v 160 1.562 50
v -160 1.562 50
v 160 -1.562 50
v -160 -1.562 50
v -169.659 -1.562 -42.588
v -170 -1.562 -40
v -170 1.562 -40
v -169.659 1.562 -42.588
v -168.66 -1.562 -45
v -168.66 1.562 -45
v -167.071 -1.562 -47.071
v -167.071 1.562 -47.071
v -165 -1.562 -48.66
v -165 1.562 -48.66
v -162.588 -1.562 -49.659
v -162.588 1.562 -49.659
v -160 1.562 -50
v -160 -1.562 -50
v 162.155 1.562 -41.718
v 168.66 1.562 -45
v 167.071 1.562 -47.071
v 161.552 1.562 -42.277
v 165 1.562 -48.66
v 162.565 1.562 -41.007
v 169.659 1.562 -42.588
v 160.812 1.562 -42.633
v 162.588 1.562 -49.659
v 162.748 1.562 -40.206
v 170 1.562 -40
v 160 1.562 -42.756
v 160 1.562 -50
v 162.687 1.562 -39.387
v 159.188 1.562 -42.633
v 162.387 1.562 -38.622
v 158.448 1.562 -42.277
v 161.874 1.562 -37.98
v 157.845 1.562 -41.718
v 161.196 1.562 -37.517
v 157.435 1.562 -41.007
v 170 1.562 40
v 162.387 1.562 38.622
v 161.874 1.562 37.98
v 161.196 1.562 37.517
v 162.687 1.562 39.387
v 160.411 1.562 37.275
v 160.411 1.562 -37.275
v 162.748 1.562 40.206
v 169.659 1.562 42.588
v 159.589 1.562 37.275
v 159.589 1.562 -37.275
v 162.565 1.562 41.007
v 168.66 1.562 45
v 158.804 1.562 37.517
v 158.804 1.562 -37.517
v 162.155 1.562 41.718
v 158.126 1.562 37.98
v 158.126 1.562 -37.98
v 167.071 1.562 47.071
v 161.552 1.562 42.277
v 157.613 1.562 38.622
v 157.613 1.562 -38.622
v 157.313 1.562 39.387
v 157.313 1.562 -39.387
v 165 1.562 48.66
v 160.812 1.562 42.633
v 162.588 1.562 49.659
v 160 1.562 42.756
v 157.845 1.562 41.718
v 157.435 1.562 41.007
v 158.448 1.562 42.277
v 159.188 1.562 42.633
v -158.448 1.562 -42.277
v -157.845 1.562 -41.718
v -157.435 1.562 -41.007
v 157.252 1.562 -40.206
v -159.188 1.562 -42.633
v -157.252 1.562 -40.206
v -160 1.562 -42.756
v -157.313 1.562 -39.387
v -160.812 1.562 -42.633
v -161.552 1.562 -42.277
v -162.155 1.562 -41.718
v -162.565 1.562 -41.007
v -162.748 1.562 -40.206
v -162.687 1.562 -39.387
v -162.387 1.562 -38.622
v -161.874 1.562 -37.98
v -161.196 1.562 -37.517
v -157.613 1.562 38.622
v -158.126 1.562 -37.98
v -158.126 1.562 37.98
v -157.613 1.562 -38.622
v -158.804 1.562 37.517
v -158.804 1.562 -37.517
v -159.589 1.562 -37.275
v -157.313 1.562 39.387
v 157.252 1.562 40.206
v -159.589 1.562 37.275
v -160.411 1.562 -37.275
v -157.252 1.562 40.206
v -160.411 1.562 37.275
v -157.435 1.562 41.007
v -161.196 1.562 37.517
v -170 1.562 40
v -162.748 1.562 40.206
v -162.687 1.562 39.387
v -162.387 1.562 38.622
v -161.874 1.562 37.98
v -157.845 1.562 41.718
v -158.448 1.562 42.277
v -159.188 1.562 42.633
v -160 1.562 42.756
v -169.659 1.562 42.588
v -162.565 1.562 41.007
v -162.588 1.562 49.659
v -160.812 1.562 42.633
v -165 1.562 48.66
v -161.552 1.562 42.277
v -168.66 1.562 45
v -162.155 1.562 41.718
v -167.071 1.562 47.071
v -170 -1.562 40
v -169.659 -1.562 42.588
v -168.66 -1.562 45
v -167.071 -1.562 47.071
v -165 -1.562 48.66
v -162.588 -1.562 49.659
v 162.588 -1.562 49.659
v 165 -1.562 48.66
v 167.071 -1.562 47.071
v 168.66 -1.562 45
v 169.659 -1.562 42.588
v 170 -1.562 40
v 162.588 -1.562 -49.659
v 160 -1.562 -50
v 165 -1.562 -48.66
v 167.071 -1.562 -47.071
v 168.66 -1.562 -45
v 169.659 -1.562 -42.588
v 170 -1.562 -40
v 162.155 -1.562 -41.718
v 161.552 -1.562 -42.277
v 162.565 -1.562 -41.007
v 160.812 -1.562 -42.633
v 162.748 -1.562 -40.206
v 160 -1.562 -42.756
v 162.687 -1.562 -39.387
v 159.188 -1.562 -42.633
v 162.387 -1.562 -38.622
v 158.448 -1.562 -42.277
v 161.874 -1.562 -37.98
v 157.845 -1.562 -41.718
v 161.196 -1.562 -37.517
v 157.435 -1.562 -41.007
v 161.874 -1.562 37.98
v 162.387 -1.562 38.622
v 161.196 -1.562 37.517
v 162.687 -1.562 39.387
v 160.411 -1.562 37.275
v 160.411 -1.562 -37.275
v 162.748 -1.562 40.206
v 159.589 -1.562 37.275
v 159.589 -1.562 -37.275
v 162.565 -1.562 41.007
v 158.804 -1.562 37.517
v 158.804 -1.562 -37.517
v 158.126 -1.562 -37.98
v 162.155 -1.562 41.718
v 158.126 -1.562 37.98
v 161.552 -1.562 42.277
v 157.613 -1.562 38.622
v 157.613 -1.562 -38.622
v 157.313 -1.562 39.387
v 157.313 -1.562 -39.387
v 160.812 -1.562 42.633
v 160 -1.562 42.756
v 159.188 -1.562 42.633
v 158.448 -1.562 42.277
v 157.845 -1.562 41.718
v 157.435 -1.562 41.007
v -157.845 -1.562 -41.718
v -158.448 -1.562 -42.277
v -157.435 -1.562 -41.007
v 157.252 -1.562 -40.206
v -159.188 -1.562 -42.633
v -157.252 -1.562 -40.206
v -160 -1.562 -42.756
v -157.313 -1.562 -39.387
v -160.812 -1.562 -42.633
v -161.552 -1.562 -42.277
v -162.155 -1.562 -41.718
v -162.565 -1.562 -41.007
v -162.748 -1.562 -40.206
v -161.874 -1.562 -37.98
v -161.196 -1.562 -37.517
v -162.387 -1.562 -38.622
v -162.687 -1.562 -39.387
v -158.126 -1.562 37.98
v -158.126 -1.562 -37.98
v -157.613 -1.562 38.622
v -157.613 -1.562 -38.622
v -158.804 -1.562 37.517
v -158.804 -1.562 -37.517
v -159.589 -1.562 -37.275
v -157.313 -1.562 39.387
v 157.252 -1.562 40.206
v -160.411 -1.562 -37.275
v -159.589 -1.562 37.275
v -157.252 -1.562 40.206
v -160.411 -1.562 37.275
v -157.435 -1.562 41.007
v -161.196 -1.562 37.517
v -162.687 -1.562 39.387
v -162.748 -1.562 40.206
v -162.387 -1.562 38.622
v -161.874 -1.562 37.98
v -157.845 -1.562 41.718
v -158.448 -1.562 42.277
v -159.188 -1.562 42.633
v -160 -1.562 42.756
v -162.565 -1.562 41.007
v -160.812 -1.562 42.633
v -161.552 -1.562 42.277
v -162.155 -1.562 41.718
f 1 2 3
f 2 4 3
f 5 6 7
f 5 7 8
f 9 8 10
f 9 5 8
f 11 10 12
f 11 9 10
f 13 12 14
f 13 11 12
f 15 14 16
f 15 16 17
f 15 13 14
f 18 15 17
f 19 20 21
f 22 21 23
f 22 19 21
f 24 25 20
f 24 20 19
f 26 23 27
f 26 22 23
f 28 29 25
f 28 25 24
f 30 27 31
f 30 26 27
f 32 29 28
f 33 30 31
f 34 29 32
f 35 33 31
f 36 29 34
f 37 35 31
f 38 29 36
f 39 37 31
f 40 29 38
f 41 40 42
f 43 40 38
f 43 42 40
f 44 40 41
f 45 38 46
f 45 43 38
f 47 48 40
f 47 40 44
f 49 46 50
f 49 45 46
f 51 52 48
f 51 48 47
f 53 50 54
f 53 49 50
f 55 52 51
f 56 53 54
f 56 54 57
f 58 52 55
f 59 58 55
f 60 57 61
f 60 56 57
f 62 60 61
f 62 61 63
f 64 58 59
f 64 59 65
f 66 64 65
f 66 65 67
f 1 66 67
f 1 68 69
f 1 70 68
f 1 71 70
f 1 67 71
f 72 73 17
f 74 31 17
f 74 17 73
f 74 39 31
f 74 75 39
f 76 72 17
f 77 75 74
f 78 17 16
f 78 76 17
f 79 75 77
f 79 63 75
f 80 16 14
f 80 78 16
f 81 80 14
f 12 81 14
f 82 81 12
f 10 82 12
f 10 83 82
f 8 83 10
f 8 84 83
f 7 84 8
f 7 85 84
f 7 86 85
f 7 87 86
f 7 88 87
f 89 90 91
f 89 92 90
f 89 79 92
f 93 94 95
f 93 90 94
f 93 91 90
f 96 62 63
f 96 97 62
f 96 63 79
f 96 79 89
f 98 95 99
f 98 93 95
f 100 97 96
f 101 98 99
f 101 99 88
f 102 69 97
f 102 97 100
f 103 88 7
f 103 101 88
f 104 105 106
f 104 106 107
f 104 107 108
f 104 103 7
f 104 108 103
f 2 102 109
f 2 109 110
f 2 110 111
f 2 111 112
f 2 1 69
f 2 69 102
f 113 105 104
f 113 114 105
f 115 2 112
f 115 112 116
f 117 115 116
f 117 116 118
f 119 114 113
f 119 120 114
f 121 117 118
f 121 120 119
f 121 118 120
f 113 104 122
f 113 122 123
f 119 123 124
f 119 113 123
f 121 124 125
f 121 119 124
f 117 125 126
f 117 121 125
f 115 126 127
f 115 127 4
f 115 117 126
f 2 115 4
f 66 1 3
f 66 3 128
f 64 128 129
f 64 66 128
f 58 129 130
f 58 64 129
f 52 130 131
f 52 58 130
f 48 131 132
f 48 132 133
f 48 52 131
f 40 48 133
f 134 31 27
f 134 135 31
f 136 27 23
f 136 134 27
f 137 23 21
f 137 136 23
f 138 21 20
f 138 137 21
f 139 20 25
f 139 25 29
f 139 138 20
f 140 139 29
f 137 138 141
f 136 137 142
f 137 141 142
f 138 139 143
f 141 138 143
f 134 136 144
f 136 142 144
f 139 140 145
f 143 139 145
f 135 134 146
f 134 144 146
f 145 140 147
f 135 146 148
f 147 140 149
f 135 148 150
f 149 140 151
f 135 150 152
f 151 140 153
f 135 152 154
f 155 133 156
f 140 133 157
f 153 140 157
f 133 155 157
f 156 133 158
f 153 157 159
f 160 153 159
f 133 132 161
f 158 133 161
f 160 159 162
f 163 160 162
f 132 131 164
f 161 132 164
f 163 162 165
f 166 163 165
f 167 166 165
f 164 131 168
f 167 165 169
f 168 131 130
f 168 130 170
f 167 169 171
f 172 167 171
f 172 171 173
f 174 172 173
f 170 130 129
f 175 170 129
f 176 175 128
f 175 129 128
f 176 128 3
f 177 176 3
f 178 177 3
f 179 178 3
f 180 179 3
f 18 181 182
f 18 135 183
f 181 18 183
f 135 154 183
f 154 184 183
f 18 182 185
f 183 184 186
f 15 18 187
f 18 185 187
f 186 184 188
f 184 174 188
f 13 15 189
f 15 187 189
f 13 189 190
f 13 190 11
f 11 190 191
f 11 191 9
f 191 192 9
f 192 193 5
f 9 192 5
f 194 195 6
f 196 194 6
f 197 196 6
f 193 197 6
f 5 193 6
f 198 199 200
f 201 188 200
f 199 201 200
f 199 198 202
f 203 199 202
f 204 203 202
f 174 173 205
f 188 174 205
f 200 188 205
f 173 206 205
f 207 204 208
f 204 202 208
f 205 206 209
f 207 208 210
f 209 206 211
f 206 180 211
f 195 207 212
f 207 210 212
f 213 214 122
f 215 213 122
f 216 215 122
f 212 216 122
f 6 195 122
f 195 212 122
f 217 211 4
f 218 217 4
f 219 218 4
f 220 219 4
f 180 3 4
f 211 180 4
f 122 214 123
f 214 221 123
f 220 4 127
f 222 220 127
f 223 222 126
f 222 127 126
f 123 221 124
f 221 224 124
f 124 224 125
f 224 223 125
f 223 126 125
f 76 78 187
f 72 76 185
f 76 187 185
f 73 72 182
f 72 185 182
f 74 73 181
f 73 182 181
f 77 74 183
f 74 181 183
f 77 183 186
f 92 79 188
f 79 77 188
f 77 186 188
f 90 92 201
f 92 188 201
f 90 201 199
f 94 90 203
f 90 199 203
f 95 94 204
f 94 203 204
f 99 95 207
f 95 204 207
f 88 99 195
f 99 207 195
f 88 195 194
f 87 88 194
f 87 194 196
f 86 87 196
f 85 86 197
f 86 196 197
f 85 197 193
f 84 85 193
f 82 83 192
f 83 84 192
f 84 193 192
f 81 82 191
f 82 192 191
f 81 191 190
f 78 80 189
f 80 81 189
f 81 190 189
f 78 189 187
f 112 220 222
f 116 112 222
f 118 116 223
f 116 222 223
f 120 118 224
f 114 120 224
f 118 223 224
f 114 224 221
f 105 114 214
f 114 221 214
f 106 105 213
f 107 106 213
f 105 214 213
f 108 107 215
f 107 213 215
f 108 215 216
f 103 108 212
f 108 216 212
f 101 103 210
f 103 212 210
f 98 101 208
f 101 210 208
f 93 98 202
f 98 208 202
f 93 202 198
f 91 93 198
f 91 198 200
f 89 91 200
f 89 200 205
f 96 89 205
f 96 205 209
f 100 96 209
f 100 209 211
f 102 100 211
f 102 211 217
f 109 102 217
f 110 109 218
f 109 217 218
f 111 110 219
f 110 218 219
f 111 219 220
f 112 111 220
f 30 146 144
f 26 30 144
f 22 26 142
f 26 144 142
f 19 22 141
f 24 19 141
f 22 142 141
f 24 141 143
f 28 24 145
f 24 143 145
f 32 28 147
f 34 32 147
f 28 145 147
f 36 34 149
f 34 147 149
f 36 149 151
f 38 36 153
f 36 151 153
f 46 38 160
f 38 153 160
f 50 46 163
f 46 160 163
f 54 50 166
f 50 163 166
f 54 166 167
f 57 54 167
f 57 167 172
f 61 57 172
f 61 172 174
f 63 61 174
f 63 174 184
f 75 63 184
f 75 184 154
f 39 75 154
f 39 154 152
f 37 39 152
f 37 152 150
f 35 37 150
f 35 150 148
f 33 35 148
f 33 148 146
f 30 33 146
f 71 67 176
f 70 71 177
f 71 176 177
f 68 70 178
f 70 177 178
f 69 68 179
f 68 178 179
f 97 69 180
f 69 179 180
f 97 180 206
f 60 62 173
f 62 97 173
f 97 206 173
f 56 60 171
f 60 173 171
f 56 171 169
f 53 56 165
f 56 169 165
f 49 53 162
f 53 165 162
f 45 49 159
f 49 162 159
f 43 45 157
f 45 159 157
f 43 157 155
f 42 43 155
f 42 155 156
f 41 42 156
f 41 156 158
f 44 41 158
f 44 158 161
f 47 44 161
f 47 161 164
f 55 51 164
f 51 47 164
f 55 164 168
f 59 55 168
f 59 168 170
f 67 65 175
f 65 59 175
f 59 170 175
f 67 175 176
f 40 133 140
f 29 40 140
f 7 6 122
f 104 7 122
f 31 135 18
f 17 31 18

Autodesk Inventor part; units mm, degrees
ref_plane "YZ Plane" through (0, 0, 0) normal (1, 0, 0) x (0, 1, 0)
ref_plane "XZ Plane" through (0, 0, 0) normal (0, 1, 0) x (-1, 0, 0)
ref_plane "XY Plane" through (0, 0, 0) normal (0, 0, 1) x (1, 0, 0)
sketch "Sketch1" plane through (0, 0, 0) normal (0, 1, 0) x (-1, 0, 0)
  line L0 (170, 50) -> (-170, 50)
  line L1 (-170, 50) -> (-170, -50)
  line L2 (-170, -50) -> (170, -50)
  line L3 (170, -50) -> (170, 50)
  line L4 (170, 50) -> (-170, -50) construction
  line L5 (-170, 50) -> (170, -50) construction
  point P0 (0, 0)
  dimension "d0" = 340
  dimension "d1" = 100
extrude "Extrusion1" add sketch "Sketch1" along normal mid plane 3.125
fillet "Fillet1" radius 10 4 edges at (-170, 0, 50) (-170, 0, -50) (170, 0, -50) (170, 0, 50)
sketch "Sketch2" plane through (0, 1.5625, 0) normal (0, 1, 0) x (1, 0, 0)
  arc A0 (160, -50) -> (170, -40) centre (160, -40) ccw projected
  line L0 (160, 50) -> (-160, 50) projected
  arc A1 (-160, 50) -> (-170, 40) centre (-160, 40) ccw projected
  line L1 (-160, -50) -> (160, -50) projected
  line L2 (170, -40) -> (170, 40) projected
  arc A2 (170, 40) -> (160, 50) centre (160, 40) ccw projected
  line L3 (-170, 40) -> (-170, -40) projected
  arc A3 (-170, -40) -> (-160, -50) centre (-160, -40) ccw projected
  point P0 (0, 0)
  dimension "d0" = 340
  dimension "d6" = 10
  dimension "d14" = 10
hole "Hole1" at (-160, 1.5625, 40) direction (0, -1, 0) diameter 5.5118 end through all clearance for "Socket Head Cap Screw" size "M5" standard "Ansi Metric M Profile"
mirror "Mirror1" about plane through (0, 0, 0) normal (0, 0, 1) of "Hole1"
mirror "Mirror2" about plane through (0, 0, 0) normal (1, 0, 0) of "Hole1", "Mirror1"
equation "\"d1\" = suppourtPlateLength"
equation "\"d2\" = acrylicThickness"
equation "\"suppourtPlateLength\" = 100"
equation "\"acrylicThickness\" = 3.125"
properties part number "supportPlate" material "ABS Plastic"
